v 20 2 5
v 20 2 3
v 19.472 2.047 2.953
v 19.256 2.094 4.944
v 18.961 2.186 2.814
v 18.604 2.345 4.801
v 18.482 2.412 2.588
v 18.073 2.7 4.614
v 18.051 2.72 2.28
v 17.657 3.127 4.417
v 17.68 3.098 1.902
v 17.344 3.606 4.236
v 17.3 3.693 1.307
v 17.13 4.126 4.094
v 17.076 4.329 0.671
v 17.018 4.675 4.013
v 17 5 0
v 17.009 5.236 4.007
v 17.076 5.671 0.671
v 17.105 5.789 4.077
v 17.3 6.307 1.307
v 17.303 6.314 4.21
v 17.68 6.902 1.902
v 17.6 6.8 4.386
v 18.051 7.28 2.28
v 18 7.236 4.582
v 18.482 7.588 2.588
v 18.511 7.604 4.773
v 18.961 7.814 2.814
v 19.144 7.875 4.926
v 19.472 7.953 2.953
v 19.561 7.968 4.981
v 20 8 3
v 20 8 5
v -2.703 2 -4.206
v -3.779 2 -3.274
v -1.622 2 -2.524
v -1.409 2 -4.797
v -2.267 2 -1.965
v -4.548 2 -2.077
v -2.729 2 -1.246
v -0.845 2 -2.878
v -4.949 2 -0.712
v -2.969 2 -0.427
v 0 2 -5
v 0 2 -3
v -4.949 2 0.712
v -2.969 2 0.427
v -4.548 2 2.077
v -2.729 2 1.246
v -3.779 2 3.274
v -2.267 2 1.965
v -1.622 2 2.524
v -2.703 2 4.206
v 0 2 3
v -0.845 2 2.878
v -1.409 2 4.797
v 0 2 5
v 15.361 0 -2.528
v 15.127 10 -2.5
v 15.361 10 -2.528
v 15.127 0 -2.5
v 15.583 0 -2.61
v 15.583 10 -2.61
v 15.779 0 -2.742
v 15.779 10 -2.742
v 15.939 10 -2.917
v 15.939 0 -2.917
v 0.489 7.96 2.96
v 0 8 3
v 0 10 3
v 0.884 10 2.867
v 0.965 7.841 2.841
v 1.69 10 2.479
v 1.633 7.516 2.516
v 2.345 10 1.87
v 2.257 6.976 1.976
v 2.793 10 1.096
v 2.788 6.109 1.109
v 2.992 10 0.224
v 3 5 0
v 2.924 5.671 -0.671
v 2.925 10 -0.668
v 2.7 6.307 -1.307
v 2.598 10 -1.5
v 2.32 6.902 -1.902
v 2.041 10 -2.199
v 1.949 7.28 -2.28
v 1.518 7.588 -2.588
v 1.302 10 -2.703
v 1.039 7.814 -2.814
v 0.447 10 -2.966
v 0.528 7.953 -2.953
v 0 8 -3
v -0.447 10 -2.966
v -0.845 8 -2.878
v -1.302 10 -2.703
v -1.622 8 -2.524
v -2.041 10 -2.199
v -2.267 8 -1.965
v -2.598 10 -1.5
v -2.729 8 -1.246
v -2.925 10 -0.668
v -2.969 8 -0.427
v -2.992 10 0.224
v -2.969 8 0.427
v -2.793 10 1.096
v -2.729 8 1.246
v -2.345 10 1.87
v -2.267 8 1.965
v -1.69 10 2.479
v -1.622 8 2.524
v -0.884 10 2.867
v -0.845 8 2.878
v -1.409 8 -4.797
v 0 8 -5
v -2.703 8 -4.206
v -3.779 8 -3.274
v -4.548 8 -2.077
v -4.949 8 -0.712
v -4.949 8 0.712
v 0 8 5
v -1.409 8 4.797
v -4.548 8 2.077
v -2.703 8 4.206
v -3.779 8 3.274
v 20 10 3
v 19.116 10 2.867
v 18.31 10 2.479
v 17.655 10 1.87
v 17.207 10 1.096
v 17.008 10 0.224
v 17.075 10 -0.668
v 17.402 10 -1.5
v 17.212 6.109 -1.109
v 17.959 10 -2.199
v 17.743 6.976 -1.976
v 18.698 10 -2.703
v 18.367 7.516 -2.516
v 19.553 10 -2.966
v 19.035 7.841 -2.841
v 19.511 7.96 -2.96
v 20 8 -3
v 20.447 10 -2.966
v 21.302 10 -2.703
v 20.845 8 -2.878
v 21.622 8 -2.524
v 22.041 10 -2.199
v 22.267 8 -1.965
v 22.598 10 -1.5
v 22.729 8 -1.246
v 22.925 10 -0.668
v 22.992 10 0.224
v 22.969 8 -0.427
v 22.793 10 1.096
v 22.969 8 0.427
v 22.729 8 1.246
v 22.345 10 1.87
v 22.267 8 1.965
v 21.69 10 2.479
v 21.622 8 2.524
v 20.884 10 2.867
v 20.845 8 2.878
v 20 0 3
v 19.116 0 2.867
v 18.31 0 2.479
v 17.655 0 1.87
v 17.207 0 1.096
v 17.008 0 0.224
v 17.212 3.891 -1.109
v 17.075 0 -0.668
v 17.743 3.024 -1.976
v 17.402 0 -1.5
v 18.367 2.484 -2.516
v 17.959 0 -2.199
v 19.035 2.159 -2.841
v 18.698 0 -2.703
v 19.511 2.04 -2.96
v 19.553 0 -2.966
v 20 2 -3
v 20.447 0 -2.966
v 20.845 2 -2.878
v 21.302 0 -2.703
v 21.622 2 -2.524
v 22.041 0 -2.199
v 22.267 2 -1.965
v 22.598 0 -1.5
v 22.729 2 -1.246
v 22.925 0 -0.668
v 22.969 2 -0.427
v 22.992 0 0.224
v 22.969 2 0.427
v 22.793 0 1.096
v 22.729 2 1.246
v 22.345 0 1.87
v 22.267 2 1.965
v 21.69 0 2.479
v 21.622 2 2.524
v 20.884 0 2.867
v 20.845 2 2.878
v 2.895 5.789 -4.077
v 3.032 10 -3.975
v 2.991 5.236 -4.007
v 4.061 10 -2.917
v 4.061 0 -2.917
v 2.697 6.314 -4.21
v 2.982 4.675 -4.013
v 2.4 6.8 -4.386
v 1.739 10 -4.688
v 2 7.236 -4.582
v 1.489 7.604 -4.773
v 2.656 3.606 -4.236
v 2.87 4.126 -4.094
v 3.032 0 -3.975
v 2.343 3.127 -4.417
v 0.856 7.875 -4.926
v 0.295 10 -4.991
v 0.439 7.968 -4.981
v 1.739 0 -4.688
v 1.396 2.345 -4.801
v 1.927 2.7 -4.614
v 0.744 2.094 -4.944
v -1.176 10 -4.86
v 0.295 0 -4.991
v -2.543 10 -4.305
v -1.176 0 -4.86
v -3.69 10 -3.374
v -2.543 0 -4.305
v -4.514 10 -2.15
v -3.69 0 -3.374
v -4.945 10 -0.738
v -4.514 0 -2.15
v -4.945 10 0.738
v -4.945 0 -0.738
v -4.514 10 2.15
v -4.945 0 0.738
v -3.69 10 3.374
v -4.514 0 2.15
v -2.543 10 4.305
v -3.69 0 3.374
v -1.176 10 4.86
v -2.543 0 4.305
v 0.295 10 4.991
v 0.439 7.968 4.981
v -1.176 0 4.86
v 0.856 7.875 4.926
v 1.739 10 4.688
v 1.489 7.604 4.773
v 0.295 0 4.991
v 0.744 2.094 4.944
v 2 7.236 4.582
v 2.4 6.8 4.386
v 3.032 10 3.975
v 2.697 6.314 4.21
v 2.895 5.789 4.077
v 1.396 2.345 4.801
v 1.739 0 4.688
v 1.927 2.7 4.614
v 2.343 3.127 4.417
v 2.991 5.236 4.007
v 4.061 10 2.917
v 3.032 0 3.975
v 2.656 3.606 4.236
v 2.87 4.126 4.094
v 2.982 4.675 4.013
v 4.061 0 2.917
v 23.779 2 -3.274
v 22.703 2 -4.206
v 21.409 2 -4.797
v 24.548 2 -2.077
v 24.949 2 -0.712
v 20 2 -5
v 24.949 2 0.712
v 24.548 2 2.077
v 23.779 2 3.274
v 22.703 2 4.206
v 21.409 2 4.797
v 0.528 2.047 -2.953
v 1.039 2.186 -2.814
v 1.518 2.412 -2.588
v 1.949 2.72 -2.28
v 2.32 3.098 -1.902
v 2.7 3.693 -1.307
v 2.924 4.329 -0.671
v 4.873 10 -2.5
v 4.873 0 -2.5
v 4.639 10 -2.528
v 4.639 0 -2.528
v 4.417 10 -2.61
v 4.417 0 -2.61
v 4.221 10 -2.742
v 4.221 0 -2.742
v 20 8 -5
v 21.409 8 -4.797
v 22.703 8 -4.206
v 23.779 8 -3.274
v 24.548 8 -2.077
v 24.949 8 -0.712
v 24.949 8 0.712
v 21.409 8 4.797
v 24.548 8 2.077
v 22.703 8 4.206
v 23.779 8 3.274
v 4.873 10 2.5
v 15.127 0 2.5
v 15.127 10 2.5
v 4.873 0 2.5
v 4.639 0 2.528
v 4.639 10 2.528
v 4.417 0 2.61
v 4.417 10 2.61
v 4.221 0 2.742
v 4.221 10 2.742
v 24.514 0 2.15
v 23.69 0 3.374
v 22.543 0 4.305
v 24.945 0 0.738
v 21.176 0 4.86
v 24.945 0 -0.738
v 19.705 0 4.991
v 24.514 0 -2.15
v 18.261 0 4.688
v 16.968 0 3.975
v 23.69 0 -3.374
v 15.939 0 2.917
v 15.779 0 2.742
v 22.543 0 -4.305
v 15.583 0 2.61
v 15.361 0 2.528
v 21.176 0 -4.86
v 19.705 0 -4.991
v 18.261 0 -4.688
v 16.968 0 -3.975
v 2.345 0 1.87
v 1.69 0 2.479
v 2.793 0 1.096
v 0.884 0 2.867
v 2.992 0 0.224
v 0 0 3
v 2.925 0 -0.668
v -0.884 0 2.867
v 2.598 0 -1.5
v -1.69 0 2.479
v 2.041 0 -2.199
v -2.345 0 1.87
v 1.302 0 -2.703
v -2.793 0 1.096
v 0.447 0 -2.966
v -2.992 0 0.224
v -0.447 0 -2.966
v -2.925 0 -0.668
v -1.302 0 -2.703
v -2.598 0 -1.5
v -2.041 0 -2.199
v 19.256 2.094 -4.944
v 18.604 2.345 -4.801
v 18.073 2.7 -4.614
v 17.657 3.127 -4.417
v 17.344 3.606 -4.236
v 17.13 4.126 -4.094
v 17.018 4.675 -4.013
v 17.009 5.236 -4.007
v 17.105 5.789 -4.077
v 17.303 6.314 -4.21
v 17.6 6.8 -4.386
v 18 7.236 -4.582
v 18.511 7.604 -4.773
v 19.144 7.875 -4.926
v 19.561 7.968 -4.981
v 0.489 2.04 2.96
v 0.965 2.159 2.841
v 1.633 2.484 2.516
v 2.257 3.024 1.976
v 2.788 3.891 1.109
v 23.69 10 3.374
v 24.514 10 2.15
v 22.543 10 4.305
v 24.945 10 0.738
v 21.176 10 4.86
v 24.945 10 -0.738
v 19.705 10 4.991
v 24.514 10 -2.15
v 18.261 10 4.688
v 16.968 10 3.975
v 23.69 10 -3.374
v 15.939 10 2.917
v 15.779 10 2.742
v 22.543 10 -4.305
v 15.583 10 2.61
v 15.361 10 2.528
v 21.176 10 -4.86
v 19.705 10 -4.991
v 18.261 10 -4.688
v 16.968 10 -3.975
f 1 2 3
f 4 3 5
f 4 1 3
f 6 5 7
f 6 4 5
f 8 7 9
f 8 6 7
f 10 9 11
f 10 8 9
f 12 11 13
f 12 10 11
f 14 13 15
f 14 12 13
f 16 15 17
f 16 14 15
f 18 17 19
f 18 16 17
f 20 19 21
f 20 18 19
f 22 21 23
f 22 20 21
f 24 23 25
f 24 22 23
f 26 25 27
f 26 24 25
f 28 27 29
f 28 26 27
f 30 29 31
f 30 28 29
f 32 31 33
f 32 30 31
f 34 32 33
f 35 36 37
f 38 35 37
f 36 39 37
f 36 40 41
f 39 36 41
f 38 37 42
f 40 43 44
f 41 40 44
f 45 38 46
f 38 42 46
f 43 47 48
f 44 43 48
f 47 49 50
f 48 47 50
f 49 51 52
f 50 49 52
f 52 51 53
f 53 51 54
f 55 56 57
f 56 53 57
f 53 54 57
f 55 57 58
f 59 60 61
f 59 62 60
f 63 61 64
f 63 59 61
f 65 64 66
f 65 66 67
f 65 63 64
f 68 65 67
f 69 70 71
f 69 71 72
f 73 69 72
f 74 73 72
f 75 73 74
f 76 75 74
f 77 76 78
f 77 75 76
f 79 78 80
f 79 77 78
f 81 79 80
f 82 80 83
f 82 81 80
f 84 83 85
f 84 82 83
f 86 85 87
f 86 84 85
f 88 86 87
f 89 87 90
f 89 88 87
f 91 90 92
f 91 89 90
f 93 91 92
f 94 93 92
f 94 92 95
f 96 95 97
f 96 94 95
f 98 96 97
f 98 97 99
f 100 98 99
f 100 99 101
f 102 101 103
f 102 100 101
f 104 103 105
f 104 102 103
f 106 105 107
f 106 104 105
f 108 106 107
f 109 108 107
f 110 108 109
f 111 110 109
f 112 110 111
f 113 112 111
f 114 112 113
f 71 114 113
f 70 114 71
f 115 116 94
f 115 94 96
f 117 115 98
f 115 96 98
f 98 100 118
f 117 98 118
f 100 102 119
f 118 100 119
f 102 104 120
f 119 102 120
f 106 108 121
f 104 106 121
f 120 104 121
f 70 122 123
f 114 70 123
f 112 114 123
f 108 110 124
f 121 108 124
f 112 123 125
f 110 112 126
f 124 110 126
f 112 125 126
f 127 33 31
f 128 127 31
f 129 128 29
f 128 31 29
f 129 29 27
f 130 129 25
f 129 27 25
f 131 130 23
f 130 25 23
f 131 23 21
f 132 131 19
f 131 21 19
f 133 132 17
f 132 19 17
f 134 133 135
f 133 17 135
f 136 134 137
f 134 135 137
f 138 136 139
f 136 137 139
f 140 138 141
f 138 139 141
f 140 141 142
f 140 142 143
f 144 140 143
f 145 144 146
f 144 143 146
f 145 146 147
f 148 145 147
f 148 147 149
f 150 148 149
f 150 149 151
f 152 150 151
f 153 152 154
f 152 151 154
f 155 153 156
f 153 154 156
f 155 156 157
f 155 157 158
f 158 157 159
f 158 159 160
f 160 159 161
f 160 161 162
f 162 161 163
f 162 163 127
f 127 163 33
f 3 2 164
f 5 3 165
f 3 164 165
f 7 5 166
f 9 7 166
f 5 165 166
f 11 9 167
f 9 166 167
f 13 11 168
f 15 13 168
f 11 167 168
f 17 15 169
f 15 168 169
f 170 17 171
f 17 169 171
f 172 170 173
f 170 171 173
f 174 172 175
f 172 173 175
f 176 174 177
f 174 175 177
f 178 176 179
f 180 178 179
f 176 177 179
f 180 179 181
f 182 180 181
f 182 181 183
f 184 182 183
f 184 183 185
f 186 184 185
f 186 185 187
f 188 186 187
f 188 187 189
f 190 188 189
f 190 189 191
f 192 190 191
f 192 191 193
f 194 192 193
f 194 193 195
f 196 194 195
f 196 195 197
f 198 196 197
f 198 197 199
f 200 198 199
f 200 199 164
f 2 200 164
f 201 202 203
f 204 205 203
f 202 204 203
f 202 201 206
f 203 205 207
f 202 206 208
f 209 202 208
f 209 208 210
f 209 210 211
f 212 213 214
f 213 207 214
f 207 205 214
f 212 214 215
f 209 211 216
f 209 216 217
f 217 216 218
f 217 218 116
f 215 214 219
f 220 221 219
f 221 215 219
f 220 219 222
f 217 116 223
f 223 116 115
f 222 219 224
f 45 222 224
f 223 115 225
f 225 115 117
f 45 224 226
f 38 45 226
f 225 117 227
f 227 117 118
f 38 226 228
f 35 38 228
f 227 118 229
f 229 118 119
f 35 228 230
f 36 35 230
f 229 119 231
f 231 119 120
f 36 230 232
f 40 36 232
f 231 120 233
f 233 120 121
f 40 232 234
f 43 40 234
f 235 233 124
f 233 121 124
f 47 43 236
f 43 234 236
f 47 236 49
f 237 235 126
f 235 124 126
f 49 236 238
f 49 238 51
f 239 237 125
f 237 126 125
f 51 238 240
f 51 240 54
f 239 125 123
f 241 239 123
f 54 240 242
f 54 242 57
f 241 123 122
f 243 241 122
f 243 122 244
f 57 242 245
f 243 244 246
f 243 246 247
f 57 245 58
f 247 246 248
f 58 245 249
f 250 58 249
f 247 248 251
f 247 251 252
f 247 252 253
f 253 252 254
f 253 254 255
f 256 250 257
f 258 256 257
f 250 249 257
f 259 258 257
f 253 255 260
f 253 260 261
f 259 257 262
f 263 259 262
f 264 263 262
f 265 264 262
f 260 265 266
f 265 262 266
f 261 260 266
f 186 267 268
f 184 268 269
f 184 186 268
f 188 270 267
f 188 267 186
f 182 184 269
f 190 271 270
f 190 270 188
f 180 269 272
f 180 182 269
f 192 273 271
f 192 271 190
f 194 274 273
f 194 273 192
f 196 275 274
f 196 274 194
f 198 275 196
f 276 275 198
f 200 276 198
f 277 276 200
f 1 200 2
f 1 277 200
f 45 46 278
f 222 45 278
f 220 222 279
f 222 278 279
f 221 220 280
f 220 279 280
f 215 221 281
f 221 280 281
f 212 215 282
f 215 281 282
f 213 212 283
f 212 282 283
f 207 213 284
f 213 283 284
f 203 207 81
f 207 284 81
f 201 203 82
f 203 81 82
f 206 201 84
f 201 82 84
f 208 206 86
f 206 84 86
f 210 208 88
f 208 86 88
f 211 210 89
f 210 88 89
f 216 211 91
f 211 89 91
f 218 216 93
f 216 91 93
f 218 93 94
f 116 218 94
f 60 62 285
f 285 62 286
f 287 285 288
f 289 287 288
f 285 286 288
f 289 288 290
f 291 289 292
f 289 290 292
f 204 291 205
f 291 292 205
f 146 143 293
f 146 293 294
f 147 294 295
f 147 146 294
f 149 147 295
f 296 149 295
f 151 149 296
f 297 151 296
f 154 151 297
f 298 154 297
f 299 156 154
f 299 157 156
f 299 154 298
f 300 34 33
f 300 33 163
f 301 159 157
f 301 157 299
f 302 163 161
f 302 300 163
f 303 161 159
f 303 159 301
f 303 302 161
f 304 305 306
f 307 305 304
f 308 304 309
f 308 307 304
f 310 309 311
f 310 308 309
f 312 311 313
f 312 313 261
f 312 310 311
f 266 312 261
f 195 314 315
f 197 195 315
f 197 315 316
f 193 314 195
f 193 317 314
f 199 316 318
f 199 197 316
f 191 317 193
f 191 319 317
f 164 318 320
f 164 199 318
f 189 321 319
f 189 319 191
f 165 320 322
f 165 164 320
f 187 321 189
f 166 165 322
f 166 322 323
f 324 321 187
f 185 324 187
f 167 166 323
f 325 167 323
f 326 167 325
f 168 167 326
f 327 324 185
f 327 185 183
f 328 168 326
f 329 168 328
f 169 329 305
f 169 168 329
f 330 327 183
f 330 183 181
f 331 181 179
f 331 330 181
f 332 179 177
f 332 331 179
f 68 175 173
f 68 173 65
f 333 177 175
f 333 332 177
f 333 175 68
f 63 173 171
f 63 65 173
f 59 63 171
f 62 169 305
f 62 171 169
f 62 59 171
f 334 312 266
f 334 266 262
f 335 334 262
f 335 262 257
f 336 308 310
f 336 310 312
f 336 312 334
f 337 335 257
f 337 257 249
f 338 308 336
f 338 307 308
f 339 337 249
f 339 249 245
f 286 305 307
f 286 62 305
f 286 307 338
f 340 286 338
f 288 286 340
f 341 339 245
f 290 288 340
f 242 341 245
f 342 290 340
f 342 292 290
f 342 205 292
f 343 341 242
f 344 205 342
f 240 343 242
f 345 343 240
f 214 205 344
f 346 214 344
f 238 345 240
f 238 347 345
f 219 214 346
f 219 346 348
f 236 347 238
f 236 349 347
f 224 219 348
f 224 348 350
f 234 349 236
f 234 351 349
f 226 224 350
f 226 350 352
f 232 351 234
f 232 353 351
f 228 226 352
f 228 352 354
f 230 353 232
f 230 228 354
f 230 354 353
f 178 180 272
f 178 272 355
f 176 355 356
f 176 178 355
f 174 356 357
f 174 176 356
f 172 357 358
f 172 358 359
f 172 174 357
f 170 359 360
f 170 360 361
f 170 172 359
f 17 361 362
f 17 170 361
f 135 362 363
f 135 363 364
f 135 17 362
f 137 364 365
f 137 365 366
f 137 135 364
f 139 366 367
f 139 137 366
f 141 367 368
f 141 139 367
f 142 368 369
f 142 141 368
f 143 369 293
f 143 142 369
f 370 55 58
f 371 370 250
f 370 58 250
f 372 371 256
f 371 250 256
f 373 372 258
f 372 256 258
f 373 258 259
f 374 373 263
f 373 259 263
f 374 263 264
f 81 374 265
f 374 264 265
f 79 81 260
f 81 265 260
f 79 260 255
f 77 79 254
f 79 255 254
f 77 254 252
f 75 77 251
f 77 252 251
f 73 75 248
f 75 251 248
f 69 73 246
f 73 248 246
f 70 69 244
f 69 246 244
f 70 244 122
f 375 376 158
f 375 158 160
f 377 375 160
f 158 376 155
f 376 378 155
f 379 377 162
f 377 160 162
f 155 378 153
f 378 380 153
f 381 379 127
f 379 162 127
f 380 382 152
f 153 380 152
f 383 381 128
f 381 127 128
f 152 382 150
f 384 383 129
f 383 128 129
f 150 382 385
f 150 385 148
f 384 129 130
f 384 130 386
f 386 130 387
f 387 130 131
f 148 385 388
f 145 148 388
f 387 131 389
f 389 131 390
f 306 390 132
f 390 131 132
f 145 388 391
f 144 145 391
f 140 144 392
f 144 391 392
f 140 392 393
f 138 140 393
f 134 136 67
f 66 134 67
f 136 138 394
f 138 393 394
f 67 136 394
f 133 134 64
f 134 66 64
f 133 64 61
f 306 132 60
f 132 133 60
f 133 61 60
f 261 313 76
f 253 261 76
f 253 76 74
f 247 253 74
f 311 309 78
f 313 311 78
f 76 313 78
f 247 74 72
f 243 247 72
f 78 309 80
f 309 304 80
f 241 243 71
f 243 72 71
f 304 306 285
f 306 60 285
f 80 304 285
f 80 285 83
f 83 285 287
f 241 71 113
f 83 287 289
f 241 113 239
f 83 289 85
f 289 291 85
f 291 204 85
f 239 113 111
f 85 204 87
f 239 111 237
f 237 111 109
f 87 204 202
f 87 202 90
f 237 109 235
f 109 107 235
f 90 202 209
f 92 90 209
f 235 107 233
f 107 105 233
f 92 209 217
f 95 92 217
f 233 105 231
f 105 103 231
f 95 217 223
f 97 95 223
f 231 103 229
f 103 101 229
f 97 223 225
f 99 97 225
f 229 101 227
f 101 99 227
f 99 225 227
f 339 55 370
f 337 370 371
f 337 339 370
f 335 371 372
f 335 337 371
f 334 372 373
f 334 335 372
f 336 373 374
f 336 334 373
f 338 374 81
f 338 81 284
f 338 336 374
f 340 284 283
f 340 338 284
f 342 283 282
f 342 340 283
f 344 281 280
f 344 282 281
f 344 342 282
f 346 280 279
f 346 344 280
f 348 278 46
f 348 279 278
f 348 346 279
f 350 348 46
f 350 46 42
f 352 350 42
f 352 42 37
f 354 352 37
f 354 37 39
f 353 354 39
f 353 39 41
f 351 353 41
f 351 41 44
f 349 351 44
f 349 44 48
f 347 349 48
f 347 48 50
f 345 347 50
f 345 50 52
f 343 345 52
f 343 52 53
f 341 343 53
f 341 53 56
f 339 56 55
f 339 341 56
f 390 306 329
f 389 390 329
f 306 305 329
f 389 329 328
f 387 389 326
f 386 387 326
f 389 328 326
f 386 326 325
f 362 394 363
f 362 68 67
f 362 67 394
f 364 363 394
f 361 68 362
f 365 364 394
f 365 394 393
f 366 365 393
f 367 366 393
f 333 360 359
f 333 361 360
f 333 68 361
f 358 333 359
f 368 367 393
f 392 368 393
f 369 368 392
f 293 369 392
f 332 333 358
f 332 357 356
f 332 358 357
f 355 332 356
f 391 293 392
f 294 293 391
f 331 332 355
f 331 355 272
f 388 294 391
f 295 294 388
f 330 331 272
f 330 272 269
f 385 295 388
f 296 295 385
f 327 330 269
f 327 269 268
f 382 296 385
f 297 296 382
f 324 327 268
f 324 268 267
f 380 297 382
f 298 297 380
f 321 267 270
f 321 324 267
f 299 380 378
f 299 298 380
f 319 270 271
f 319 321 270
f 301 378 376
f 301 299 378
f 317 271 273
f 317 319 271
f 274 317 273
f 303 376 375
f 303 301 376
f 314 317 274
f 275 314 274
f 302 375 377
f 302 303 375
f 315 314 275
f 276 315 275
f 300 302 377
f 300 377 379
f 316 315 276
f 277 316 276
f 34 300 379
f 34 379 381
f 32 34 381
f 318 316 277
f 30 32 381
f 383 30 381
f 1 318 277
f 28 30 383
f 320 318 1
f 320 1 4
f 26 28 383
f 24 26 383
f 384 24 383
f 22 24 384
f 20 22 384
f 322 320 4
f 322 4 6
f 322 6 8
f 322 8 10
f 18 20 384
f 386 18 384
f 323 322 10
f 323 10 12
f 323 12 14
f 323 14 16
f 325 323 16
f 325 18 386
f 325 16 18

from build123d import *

# Parameters (mm, degrees)
SKETCH1_W            = 10
SKETCH1_H            = 5
BOSS_EXTRUDE1_DEPTH  = 10
SKETCH2_R            = 5
BOSS_EXTRUDE2_DEPTH  = 10
CUT_EXTRUDE1_REACH   = 17
SKETCH3_R            = 3
CUT_EXTRUDE2_DEPTH   = 16
FILLET1_R            = 1
FILLET1_OF_MIRROR1_R = 1


with BuildPart() as part:
    # Sketch1 → Boss-Extrude1 (new body)
    with BuildSketch(Plane(origin=(0, 0, 0), x_dir=(1, 0, 0), z_dir=(0, 1, 0))):
        with Locations((5, 0)):
            Rectangle(SKETCH1_W, SKETCH1_H)
    boss_extrude1 = extrude(amount=BOSS_EXTRUDE1_DEPTH)

    # Sketch2 → Boss-Extrude2 (add)
    with BuildSketch(Plane(origin=(0, 0, 0), x_dir=(1, 0, 0), z_dir=(0, 1, 0))):
        Circle(SKETCH2_R)
    boss_extrude2 = extrude(amount=BOSS_EXTRUDE2_DEPTH)

    # Sketch3 → Cut-Extrude1 (cut, up to next)
    with BuildSketch(Plane(origin=(0, 0, 0), x_dir=(1, 0, 0), z_dir=(0, 1, 0)), mode=Mode.PRIVATE) as cut_extrude1_sk1:
        with Locations(Location((0, 0, 0), (0, 0, 270))):
            Circle(SKETCH3_R)
    cut_extrude1_tool1 = extrude(cut_extrude1_sk1.sketch, amount=CUT_EXTRUDE1_REACH, mode=Mode.PRIVATE) & part.part
    cut_extrude1 = cut_extrude1_tool1.solids().sort_by_distance((0, 0, 0))[0]
    add(cut_extrude1, mode=Mode.SUBTRACT)

    # Sketch4 → Cut-Extrude2 (cut, symmetric)
    with BuildSketch(Plane.XY):
        with BuildLine():
            Line((0, 8), (-5, 8))
            Line((-5, 8), (-5, 2))
            Line((-5, 2), (0, 2))
            ThreePointArc((0, 2), (3, 5), (0, 8))
        make_face()
    cut_extrude2 = extrude(amount=CUT_EXTRUDE2_DEPTH, both=True, mode=Mode.SUBTRACT)

    # Fillet1
    fillet1_edges = [part.edges().sort_by_distance(p)[0] for p in [
        (4.330127019, 5, 2.5),
        (4.330127019, 5, -2.5),
    ]]
    fillet(fillet1_edges, radius=FILLET1_R)

    # Mirror1: Boss-Extrude1, Boss-Extrude2, Cut-Extrude1, Cut-Extrude2 across plane
    add(boss_extrude1.mirror(Plane(origin=(10, 10, -2.5), x_dir=(0, 0, 1), z_dir=(-1, 0, 0))))
    add(boss_extrude2.mirror(Plane(origin=(10, 10, -2.5), x_dir=(0, 0, 1), z_dir=(-1, 0, 0))))
    add(cut_extrude1.mirror(Plane(origin=(10, 10, -2.5), x_dir=(0, 0, 1), z_dir=(-1, 0, 0))), mode=Mode.SUBTRACT)
    add(cut_extrude2.mirror(Plane(origin=(10, 10, -2.5), x_dir=(0, 0, 1), z_dir=(-1, 0, 0))), mode=Mode.SUBTRACT)

    # Fillet1 of Mirror1
    fillet1_of_mirror1_edges = [part.edges().sort_by_distance(p)[0] for p in [
        (15.669872981, 5, 2.5),
        (15.669872981, 5, -2.5),
    ]]
    fillet(fillet1_of_mirror1_edges, radius=FILLET1_OF_MIRROR1_R)


solid = part.part
